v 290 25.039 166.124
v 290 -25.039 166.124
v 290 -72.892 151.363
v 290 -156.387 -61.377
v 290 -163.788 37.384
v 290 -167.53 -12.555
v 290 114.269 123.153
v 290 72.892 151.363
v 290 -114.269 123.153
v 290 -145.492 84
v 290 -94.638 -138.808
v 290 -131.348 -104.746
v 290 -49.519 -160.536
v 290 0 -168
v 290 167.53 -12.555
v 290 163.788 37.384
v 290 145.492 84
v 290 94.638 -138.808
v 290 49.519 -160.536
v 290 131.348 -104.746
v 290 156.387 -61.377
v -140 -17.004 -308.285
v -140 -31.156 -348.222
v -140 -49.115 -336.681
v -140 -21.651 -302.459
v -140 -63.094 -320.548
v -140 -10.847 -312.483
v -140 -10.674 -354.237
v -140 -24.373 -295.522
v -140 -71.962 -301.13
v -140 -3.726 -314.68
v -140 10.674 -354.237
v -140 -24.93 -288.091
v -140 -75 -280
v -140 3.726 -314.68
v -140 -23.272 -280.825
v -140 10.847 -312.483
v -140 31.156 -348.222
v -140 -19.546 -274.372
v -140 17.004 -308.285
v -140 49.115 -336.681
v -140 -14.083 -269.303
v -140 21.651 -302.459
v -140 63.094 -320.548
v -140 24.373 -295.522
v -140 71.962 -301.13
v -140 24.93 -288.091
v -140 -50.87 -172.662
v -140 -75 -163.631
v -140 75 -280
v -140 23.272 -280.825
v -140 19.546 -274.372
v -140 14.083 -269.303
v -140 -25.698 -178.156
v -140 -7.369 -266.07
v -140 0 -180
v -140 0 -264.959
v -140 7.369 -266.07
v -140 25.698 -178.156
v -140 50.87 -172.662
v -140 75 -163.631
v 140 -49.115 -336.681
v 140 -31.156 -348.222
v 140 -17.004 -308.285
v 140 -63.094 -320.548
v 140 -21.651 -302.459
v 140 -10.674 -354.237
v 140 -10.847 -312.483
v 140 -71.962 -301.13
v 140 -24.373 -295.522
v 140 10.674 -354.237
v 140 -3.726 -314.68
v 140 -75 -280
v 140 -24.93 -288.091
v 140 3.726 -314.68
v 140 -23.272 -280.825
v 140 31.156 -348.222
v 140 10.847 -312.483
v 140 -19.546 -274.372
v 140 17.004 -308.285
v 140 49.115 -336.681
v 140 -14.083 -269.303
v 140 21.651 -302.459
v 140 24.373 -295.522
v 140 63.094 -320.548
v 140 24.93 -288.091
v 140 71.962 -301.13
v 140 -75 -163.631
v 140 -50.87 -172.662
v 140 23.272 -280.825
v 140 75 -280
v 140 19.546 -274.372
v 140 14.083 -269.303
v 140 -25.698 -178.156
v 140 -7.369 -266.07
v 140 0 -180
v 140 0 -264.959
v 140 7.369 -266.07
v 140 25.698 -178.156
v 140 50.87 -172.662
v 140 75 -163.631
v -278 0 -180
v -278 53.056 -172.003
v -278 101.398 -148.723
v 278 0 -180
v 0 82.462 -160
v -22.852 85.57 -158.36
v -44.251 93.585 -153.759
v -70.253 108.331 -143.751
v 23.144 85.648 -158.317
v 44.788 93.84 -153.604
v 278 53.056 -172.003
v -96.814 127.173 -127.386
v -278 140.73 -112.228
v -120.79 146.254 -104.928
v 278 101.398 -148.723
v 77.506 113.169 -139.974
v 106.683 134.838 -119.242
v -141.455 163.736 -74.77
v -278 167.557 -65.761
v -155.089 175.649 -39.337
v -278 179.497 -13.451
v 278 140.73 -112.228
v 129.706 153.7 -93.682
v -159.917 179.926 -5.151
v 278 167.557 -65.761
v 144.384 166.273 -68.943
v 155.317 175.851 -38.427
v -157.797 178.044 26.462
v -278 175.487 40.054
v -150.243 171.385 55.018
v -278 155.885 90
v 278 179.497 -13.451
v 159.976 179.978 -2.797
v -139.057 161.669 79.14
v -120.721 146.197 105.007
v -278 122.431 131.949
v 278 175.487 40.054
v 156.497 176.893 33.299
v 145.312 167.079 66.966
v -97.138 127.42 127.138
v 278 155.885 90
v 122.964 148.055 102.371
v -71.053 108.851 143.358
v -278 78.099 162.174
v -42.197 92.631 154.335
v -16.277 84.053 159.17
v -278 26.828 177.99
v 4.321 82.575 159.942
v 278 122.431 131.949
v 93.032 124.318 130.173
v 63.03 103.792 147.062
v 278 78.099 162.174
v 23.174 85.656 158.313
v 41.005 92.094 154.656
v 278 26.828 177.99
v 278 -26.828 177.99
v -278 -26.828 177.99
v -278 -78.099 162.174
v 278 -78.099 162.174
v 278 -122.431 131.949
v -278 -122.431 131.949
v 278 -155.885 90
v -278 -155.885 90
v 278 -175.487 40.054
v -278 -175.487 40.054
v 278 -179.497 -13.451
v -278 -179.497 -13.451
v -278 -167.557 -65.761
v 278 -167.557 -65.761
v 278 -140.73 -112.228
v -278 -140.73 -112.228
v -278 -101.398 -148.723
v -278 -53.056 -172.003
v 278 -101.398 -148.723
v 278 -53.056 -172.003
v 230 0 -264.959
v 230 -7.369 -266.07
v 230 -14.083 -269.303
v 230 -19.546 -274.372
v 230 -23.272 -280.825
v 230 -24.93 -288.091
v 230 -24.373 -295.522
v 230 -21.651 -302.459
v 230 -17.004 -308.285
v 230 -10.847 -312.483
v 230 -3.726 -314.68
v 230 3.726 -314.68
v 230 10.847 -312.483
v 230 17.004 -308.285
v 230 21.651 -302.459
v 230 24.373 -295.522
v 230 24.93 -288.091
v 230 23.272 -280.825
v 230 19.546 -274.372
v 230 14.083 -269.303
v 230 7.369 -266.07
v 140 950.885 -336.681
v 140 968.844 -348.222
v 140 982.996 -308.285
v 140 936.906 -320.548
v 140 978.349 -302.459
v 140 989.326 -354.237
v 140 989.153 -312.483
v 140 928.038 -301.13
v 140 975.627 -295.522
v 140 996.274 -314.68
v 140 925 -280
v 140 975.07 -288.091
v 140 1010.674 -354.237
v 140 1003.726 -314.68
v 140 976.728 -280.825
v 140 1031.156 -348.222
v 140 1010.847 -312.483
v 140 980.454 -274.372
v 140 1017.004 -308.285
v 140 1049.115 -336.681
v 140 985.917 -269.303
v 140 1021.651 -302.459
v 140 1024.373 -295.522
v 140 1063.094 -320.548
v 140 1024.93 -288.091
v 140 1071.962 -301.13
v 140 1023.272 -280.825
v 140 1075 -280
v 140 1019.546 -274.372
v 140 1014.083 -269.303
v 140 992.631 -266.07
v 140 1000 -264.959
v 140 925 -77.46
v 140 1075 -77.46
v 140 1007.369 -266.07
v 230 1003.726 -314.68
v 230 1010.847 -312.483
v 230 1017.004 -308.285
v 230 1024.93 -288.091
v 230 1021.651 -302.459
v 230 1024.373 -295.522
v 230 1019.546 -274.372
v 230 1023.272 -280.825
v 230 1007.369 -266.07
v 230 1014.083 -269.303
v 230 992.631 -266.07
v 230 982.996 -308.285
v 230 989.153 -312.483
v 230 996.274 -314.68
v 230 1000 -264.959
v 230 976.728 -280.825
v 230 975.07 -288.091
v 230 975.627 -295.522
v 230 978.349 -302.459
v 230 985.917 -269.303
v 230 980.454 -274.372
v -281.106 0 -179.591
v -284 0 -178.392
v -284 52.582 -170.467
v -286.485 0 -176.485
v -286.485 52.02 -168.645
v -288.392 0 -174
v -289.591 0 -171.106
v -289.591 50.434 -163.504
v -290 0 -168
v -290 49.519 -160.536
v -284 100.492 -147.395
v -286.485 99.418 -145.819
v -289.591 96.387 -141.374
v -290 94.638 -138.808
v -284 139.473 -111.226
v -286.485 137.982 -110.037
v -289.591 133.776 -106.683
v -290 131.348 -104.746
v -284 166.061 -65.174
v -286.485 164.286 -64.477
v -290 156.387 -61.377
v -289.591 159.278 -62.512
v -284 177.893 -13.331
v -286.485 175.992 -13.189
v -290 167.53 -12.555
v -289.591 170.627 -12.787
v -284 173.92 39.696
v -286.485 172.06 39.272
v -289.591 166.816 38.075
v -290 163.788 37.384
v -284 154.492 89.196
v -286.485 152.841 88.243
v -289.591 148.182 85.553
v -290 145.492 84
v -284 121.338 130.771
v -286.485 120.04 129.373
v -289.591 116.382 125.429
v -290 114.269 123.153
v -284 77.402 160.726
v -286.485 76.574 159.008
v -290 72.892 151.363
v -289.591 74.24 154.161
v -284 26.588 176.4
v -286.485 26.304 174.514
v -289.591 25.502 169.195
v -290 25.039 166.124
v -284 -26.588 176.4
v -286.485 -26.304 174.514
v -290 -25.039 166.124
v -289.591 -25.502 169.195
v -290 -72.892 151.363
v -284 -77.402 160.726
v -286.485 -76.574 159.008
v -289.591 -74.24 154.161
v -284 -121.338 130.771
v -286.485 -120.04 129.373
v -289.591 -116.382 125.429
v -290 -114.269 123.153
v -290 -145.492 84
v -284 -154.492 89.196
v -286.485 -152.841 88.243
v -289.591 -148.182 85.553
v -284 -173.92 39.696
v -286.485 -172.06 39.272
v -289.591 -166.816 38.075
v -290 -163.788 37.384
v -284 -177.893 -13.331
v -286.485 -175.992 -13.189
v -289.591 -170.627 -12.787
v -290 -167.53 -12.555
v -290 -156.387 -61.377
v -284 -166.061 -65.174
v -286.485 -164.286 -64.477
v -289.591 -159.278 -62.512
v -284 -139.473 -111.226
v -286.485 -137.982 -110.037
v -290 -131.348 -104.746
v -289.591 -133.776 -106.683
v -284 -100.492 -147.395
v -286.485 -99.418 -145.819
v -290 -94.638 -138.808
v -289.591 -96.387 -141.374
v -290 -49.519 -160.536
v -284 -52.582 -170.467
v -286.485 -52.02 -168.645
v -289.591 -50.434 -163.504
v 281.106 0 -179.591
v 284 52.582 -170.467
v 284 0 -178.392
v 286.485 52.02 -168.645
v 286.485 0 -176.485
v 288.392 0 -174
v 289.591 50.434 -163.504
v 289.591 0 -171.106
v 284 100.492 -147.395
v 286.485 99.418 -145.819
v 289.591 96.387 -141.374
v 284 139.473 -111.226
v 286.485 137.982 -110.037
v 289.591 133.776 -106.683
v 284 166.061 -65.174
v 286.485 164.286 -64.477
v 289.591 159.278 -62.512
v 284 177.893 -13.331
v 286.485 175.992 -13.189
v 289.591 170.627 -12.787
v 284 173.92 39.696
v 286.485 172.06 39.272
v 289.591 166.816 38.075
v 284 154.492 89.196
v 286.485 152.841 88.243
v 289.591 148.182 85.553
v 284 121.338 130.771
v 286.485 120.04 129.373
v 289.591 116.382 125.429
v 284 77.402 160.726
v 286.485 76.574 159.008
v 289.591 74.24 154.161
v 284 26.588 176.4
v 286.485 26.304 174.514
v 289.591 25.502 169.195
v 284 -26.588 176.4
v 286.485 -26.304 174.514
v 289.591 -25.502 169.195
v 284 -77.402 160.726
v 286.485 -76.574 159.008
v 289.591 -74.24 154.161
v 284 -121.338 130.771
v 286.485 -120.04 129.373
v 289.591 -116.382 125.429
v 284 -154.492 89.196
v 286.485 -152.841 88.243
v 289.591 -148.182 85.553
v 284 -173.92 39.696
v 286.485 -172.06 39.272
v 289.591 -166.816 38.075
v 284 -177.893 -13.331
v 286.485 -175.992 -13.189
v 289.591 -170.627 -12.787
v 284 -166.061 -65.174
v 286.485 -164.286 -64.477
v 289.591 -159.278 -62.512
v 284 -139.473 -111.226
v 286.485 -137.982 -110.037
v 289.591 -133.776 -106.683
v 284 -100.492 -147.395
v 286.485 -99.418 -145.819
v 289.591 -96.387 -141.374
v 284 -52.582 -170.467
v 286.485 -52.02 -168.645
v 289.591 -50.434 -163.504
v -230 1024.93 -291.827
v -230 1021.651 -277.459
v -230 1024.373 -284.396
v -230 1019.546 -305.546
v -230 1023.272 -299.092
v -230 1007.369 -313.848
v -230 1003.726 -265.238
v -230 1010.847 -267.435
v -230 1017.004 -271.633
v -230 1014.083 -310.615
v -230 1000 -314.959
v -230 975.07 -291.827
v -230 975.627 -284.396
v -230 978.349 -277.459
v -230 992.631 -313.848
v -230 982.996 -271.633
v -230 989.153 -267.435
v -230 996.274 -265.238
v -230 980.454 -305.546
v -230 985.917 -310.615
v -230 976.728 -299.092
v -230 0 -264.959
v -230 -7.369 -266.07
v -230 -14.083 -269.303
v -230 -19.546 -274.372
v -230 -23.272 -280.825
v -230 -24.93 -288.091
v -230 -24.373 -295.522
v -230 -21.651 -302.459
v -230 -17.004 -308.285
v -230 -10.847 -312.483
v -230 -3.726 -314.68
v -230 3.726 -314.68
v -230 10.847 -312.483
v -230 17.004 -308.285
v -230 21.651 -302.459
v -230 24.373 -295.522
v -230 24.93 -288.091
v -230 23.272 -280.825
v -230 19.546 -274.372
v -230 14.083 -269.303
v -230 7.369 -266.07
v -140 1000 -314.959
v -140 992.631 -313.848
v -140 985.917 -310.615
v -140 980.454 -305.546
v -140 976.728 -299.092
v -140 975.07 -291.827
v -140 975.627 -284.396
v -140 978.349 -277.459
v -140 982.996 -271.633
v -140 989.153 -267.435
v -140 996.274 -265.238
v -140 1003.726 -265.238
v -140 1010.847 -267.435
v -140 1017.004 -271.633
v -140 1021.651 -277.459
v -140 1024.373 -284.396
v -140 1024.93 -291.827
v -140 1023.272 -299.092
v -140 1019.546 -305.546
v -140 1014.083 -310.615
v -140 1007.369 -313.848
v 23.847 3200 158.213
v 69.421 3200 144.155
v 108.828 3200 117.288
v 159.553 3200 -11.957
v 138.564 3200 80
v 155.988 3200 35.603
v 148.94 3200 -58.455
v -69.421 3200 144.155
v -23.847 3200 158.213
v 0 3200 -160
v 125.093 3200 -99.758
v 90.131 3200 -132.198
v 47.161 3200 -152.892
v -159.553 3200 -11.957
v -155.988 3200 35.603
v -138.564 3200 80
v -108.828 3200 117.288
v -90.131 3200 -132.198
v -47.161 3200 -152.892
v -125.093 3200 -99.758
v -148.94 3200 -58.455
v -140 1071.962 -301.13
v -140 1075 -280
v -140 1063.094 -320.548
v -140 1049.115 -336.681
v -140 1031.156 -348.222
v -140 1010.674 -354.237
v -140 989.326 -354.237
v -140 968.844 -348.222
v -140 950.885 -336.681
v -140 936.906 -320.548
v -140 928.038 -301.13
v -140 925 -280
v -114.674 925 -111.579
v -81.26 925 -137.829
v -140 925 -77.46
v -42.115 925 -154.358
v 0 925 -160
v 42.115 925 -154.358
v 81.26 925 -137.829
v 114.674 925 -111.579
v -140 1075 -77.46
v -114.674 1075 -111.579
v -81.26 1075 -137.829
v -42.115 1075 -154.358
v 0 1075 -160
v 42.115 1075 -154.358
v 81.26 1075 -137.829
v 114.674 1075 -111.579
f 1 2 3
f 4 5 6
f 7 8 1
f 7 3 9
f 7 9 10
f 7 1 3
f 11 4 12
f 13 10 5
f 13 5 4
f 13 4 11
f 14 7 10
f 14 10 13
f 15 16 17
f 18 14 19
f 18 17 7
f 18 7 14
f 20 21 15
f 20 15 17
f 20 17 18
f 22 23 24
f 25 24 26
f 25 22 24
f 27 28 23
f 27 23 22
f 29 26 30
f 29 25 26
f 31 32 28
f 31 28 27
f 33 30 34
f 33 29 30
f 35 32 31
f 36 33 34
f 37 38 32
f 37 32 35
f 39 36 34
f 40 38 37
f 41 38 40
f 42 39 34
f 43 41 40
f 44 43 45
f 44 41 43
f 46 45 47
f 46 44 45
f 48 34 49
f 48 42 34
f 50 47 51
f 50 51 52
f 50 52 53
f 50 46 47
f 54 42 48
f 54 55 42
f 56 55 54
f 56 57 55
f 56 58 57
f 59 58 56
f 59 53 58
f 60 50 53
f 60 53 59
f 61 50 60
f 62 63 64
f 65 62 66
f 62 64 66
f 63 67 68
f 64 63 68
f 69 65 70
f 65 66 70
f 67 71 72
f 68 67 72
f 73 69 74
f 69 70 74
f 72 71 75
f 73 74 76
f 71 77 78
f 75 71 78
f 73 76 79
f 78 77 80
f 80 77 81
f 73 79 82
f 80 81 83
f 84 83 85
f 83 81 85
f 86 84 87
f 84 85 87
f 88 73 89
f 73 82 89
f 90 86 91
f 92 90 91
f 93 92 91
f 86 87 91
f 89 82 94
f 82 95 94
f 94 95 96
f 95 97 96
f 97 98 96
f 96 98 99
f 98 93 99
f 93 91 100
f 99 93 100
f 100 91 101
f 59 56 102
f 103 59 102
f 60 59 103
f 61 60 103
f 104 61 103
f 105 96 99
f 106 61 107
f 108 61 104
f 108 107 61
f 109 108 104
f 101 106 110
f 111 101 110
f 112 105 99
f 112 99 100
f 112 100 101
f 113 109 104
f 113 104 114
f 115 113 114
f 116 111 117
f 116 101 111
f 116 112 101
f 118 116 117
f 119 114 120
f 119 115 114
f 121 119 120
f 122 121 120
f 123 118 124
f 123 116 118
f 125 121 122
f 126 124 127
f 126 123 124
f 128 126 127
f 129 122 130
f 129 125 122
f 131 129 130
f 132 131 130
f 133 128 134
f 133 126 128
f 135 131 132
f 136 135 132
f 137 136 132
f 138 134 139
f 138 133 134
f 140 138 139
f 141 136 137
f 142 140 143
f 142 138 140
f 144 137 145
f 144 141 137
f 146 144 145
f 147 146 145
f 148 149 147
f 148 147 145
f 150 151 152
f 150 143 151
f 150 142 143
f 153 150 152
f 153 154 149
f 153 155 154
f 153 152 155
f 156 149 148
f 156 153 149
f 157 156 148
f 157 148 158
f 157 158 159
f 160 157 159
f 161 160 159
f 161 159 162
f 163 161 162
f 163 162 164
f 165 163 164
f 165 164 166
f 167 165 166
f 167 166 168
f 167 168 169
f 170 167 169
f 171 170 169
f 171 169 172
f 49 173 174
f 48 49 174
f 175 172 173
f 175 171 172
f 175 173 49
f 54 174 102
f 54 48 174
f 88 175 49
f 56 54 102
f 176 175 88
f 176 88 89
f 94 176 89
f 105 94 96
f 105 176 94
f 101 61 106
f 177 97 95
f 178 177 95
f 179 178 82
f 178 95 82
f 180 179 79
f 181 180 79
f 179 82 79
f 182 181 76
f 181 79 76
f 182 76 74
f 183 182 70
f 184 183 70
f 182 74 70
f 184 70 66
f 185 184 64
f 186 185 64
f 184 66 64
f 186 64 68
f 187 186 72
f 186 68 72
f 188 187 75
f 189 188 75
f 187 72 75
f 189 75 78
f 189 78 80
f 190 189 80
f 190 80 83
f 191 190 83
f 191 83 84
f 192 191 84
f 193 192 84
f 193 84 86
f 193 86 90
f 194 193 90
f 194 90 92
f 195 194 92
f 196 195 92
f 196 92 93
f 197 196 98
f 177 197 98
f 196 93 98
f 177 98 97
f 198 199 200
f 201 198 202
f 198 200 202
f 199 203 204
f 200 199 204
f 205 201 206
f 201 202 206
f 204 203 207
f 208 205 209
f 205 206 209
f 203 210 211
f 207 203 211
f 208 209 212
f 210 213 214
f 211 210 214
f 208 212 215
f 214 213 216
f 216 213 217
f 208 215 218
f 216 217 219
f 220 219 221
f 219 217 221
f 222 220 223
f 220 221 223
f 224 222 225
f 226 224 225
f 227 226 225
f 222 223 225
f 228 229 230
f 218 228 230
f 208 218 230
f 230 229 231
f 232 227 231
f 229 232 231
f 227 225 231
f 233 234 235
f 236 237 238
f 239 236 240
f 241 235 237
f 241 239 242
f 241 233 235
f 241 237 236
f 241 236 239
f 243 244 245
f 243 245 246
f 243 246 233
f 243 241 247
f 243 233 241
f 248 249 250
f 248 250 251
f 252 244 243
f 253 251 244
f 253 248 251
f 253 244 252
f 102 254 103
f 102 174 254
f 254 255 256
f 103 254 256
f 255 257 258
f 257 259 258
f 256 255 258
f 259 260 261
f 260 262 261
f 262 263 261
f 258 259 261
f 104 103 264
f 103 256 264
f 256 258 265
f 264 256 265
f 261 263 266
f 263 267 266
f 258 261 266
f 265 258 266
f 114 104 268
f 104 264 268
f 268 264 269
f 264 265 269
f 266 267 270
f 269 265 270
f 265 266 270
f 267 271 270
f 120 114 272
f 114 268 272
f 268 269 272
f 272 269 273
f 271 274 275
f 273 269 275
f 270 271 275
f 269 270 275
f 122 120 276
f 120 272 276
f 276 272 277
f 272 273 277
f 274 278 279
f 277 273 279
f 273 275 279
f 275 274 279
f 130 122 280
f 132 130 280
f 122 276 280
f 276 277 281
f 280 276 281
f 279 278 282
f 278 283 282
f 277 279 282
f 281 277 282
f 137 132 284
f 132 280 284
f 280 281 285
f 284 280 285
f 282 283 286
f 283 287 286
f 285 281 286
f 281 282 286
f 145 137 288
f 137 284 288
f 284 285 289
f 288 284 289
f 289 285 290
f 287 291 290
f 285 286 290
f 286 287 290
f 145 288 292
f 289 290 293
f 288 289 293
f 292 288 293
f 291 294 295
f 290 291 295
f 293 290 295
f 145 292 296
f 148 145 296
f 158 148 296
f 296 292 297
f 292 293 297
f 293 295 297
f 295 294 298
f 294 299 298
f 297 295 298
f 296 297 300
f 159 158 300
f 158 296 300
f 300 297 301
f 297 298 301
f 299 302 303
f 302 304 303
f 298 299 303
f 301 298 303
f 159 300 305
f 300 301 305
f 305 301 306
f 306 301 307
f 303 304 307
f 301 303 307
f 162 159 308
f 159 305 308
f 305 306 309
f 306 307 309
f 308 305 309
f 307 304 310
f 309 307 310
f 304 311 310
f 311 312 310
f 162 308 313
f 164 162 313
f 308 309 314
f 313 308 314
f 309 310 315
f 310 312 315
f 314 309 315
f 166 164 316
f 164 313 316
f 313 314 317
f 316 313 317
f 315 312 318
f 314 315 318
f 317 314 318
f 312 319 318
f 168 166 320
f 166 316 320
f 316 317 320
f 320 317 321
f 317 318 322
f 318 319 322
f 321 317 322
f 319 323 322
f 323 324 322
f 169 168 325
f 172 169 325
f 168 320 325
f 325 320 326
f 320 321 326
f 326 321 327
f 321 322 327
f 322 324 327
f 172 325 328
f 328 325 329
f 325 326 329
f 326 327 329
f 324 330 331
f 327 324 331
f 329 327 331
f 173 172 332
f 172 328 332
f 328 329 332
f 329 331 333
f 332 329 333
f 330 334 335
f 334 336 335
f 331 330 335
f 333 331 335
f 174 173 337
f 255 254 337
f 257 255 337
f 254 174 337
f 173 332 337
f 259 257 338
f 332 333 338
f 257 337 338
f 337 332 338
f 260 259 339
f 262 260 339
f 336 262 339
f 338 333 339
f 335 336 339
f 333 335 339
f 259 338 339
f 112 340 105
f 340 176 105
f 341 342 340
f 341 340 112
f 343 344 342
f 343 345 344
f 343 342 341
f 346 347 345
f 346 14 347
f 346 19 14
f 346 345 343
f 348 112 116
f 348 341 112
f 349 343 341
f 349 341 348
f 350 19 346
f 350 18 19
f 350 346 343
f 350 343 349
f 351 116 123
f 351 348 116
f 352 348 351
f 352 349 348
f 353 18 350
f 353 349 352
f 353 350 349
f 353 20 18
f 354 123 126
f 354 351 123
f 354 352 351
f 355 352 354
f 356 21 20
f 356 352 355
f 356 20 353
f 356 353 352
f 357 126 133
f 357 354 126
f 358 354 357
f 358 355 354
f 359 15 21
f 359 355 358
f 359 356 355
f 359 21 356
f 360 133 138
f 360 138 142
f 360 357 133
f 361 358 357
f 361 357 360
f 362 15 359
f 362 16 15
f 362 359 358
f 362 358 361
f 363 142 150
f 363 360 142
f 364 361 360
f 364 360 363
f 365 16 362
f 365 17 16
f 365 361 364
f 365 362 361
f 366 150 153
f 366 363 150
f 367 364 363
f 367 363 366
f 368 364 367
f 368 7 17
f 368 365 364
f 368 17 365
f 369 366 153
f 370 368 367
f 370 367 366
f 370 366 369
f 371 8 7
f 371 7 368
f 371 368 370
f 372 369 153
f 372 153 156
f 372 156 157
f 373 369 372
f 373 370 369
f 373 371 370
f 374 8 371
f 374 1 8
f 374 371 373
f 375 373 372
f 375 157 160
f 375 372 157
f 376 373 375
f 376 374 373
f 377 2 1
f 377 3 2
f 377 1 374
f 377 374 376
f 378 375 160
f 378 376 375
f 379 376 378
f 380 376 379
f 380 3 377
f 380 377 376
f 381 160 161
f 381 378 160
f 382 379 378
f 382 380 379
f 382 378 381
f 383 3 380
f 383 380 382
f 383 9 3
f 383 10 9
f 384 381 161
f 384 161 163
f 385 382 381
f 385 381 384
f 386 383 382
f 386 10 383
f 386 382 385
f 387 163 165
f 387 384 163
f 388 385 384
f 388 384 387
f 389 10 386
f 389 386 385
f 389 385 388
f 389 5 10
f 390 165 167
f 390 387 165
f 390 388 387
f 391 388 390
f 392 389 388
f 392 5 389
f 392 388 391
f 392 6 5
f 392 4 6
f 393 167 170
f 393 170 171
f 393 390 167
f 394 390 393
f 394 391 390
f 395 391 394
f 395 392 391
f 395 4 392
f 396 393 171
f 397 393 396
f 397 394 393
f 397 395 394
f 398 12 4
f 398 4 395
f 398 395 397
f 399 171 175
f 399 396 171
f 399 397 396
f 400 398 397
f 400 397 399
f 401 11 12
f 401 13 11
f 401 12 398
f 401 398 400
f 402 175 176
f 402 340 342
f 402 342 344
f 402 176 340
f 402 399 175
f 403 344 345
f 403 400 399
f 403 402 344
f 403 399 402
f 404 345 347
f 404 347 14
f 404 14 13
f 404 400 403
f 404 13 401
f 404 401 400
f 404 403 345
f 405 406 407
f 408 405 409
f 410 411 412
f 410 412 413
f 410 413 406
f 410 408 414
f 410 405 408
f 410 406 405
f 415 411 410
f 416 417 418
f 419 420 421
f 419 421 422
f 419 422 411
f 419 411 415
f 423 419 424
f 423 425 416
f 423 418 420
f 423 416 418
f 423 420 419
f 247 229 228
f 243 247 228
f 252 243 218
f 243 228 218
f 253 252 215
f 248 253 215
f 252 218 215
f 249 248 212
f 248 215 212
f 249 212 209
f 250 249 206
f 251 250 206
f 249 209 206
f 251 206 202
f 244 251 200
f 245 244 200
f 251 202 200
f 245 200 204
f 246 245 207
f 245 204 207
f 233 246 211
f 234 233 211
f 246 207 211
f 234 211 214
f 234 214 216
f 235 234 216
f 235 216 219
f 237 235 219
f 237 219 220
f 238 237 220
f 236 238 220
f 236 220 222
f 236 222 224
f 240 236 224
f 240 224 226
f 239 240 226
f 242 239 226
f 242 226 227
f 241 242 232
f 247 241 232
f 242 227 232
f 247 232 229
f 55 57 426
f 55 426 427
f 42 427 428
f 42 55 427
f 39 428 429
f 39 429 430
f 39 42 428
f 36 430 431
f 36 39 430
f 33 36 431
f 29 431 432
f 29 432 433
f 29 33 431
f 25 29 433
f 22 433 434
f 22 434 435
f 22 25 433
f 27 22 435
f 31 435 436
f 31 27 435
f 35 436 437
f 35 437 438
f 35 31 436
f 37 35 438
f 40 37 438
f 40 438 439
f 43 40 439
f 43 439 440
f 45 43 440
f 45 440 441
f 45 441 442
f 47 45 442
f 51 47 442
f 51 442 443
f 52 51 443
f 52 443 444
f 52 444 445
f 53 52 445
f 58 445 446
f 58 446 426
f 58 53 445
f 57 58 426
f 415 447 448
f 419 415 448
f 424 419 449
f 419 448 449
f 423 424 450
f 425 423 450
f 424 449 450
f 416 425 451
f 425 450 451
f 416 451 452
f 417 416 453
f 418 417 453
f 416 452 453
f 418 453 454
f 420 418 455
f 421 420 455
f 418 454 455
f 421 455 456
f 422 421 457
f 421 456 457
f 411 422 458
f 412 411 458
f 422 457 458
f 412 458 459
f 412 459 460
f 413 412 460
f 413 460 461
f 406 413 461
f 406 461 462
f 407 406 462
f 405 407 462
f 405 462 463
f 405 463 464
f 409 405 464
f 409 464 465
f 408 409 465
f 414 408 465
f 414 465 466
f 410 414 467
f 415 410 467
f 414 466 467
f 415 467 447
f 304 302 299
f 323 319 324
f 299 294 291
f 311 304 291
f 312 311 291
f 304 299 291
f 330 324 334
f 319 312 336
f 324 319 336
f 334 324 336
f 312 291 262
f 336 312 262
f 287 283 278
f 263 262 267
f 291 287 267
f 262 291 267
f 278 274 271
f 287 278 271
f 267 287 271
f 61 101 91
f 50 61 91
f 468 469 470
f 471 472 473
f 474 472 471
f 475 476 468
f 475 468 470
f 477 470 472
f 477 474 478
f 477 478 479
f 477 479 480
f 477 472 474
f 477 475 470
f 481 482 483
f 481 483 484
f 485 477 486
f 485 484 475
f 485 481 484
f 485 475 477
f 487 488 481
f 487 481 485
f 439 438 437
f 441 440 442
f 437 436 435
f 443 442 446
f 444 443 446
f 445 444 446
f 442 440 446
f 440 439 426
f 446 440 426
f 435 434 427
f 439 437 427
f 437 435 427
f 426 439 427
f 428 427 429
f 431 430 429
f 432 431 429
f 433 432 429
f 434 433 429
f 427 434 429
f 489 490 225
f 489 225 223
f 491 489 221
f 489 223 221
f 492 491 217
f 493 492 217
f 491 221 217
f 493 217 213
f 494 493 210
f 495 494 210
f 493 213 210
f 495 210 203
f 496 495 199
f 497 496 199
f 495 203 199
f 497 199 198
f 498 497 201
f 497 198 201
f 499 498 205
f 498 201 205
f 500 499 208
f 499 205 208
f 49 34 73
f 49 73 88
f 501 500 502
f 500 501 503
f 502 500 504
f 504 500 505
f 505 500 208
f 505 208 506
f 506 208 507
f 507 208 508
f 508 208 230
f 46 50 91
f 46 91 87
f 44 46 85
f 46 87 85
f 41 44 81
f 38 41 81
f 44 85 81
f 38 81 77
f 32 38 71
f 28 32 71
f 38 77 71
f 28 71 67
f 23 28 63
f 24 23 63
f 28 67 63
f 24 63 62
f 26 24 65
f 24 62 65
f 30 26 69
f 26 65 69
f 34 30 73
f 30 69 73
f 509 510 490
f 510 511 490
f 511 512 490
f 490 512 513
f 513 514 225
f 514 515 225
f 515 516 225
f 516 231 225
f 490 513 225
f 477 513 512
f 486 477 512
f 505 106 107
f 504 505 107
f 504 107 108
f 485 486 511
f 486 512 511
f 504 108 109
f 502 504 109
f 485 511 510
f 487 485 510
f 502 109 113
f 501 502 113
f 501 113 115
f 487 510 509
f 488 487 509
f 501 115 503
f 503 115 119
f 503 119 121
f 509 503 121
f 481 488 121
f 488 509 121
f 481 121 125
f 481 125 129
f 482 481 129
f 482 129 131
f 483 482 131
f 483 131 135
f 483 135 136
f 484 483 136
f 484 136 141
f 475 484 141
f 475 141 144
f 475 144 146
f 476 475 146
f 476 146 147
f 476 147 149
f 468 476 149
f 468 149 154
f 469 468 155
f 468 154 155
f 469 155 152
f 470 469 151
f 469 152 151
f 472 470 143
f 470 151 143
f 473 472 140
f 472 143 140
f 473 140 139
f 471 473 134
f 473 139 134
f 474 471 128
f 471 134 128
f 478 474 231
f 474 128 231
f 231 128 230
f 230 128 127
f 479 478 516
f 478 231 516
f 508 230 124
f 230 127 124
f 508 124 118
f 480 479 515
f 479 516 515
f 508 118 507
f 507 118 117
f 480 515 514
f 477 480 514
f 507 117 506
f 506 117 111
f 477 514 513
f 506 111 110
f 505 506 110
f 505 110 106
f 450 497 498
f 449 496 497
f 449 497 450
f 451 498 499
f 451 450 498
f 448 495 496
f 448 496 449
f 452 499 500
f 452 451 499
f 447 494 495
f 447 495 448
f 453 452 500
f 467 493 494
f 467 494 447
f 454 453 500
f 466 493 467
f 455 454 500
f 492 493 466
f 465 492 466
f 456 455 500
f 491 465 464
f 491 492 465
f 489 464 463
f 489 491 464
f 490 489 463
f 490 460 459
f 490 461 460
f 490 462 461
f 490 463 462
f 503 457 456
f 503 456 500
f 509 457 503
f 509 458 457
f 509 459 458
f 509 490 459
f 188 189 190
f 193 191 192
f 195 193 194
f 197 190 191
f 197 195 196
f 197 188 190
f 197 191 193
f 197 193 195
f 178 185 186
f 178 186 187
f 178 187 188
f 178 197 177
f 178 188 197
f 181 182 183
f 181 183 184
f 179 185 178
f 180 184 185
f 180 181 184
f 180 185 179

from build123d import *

# Parameters (mm, degrees)
ESQUISSE2_R                          = 180
BOSS_EXTRU_1_DEPTH                   = 290
CONG_1_R                             = 12
ESQUISSE3_R                          = 160
BOSS_EXTRU_2_DEPTH                   = 3200
BOSS_EXTRU_3_DEPTH                   = 140
ESQUISSE5_R                          = 25
BOSS_EXTRU_4_DEPTH                   = 90
R_P_TITION_LIN_AIRE2_COUNT           = 2
R_P_TITION_LIN_AIRE2_PITCH           = 1000
R_P_TITION_LIN_AIRE2_COPY_1_SKETCH_R = 25
R_P_TITION_LIN_AIRE2_COPY_1_DEPTH    = 90


with BuildPart() as part:
    # Esquisse2 → Boss.-Extru.1 (new, symmetric)
    with BuildSketch(Plane(origin=(0, 0, 0), x_dir=(0, 0, -1), z_dir=(1, 0, 0))):
        Circle(ESQUISSE2_R)
    extrude(amount=BOSS_EXTRU_1_DEPTH, both=True)

    # Congé1
    cong_1_edges = [part.edges().sort_by_distance(p)[0] for p in [
        (-290, 0, 180),
        (290, 0, 180),
    ]]
    fillet(cong_1_edges, radius=CONG_1_R)

    # Esquisse3 → Boss.-Extru.2 (add)
    with BuildSketch(Plane(origin=(0, 0, 0), x_dir=(1, 0, 0), z_dir=(0, 1, 0))):
        with Locations(Location((0, 0, 0), (0, 0, 90))):
            Circle(ESQUISSE3_R)
    extrude(amount=BOSS_EXTRU_2_DEPTH)

    # Esquisse4 → Boss.-Extru.3 (add, symmetric)
    with BuildSketch(Plane(origin=(0, 0, 0), x_dir=(0, 0, -1), z_dir=(1, 0, 0))):
        with BuildLine():
            Line((0, 75), (280, 75))
            ThreePointArc((280, 75), (355, 0), (280, -75))
            Line((280, -75), (0, -75))
            ThreePointArc((0, -75), (-75, 0), (0, 75))
        make_face()
    boss_extru_3 = extrude(amount=BOSS_EXTRU_3_DEPTH, both=True)

    # Esquisse5 → Boss.-Extru.4 (add)
    with BuildSketch(Plane(origin=(140, 0, 0), x_dir=(0, 0, -1), z_dir=(1, 0, 0))):
        with Locations(Location((289.958895705, 0, 0), (0, 0, 180))):
            Circle(ESQUISSE5_R)
    boss_extru_4 = extrude(amount=BOSS_EXTRU_4_DEPTH)

    # Symétrie1: Boss.-Extru.4 across plane
    add(boss_extru_4.mirror(Plane(origin=(0, 0, 0), x_dir=(0, 0, 1), z_dir=(1, 0, 0))))

    # Répétition linéaire2: Boss.-Extru.3, Boss.-Extru.4 ×2
    with Locations(*[(0, i * R_P_TITION_LIN_AIRE2_PITCH, 0) for i in range(1, R_P_TITION_LIN_AIRE2_COUNT)]):
        add(boss_extru_3)
        add(boss_extru_4)

    # Répétition linéaire2 copy 1 sketch → Répétition linéaire2 copy 1 (add)
    with BuildSketch(Plane(origin=(-140, 1000, 0), x_dir=(0, 0, -1), z_dir=(-1, 0, 0))):
        with Locations((289.958895705, 0)):
            Circle(R_P_TITION_LIN_AIRE2_COPY_1_SKETCH_R)
    extrude(amount=R_P_TITION_LIN_AIRE2_COPY_1_DEPTH)


solid = part.part
